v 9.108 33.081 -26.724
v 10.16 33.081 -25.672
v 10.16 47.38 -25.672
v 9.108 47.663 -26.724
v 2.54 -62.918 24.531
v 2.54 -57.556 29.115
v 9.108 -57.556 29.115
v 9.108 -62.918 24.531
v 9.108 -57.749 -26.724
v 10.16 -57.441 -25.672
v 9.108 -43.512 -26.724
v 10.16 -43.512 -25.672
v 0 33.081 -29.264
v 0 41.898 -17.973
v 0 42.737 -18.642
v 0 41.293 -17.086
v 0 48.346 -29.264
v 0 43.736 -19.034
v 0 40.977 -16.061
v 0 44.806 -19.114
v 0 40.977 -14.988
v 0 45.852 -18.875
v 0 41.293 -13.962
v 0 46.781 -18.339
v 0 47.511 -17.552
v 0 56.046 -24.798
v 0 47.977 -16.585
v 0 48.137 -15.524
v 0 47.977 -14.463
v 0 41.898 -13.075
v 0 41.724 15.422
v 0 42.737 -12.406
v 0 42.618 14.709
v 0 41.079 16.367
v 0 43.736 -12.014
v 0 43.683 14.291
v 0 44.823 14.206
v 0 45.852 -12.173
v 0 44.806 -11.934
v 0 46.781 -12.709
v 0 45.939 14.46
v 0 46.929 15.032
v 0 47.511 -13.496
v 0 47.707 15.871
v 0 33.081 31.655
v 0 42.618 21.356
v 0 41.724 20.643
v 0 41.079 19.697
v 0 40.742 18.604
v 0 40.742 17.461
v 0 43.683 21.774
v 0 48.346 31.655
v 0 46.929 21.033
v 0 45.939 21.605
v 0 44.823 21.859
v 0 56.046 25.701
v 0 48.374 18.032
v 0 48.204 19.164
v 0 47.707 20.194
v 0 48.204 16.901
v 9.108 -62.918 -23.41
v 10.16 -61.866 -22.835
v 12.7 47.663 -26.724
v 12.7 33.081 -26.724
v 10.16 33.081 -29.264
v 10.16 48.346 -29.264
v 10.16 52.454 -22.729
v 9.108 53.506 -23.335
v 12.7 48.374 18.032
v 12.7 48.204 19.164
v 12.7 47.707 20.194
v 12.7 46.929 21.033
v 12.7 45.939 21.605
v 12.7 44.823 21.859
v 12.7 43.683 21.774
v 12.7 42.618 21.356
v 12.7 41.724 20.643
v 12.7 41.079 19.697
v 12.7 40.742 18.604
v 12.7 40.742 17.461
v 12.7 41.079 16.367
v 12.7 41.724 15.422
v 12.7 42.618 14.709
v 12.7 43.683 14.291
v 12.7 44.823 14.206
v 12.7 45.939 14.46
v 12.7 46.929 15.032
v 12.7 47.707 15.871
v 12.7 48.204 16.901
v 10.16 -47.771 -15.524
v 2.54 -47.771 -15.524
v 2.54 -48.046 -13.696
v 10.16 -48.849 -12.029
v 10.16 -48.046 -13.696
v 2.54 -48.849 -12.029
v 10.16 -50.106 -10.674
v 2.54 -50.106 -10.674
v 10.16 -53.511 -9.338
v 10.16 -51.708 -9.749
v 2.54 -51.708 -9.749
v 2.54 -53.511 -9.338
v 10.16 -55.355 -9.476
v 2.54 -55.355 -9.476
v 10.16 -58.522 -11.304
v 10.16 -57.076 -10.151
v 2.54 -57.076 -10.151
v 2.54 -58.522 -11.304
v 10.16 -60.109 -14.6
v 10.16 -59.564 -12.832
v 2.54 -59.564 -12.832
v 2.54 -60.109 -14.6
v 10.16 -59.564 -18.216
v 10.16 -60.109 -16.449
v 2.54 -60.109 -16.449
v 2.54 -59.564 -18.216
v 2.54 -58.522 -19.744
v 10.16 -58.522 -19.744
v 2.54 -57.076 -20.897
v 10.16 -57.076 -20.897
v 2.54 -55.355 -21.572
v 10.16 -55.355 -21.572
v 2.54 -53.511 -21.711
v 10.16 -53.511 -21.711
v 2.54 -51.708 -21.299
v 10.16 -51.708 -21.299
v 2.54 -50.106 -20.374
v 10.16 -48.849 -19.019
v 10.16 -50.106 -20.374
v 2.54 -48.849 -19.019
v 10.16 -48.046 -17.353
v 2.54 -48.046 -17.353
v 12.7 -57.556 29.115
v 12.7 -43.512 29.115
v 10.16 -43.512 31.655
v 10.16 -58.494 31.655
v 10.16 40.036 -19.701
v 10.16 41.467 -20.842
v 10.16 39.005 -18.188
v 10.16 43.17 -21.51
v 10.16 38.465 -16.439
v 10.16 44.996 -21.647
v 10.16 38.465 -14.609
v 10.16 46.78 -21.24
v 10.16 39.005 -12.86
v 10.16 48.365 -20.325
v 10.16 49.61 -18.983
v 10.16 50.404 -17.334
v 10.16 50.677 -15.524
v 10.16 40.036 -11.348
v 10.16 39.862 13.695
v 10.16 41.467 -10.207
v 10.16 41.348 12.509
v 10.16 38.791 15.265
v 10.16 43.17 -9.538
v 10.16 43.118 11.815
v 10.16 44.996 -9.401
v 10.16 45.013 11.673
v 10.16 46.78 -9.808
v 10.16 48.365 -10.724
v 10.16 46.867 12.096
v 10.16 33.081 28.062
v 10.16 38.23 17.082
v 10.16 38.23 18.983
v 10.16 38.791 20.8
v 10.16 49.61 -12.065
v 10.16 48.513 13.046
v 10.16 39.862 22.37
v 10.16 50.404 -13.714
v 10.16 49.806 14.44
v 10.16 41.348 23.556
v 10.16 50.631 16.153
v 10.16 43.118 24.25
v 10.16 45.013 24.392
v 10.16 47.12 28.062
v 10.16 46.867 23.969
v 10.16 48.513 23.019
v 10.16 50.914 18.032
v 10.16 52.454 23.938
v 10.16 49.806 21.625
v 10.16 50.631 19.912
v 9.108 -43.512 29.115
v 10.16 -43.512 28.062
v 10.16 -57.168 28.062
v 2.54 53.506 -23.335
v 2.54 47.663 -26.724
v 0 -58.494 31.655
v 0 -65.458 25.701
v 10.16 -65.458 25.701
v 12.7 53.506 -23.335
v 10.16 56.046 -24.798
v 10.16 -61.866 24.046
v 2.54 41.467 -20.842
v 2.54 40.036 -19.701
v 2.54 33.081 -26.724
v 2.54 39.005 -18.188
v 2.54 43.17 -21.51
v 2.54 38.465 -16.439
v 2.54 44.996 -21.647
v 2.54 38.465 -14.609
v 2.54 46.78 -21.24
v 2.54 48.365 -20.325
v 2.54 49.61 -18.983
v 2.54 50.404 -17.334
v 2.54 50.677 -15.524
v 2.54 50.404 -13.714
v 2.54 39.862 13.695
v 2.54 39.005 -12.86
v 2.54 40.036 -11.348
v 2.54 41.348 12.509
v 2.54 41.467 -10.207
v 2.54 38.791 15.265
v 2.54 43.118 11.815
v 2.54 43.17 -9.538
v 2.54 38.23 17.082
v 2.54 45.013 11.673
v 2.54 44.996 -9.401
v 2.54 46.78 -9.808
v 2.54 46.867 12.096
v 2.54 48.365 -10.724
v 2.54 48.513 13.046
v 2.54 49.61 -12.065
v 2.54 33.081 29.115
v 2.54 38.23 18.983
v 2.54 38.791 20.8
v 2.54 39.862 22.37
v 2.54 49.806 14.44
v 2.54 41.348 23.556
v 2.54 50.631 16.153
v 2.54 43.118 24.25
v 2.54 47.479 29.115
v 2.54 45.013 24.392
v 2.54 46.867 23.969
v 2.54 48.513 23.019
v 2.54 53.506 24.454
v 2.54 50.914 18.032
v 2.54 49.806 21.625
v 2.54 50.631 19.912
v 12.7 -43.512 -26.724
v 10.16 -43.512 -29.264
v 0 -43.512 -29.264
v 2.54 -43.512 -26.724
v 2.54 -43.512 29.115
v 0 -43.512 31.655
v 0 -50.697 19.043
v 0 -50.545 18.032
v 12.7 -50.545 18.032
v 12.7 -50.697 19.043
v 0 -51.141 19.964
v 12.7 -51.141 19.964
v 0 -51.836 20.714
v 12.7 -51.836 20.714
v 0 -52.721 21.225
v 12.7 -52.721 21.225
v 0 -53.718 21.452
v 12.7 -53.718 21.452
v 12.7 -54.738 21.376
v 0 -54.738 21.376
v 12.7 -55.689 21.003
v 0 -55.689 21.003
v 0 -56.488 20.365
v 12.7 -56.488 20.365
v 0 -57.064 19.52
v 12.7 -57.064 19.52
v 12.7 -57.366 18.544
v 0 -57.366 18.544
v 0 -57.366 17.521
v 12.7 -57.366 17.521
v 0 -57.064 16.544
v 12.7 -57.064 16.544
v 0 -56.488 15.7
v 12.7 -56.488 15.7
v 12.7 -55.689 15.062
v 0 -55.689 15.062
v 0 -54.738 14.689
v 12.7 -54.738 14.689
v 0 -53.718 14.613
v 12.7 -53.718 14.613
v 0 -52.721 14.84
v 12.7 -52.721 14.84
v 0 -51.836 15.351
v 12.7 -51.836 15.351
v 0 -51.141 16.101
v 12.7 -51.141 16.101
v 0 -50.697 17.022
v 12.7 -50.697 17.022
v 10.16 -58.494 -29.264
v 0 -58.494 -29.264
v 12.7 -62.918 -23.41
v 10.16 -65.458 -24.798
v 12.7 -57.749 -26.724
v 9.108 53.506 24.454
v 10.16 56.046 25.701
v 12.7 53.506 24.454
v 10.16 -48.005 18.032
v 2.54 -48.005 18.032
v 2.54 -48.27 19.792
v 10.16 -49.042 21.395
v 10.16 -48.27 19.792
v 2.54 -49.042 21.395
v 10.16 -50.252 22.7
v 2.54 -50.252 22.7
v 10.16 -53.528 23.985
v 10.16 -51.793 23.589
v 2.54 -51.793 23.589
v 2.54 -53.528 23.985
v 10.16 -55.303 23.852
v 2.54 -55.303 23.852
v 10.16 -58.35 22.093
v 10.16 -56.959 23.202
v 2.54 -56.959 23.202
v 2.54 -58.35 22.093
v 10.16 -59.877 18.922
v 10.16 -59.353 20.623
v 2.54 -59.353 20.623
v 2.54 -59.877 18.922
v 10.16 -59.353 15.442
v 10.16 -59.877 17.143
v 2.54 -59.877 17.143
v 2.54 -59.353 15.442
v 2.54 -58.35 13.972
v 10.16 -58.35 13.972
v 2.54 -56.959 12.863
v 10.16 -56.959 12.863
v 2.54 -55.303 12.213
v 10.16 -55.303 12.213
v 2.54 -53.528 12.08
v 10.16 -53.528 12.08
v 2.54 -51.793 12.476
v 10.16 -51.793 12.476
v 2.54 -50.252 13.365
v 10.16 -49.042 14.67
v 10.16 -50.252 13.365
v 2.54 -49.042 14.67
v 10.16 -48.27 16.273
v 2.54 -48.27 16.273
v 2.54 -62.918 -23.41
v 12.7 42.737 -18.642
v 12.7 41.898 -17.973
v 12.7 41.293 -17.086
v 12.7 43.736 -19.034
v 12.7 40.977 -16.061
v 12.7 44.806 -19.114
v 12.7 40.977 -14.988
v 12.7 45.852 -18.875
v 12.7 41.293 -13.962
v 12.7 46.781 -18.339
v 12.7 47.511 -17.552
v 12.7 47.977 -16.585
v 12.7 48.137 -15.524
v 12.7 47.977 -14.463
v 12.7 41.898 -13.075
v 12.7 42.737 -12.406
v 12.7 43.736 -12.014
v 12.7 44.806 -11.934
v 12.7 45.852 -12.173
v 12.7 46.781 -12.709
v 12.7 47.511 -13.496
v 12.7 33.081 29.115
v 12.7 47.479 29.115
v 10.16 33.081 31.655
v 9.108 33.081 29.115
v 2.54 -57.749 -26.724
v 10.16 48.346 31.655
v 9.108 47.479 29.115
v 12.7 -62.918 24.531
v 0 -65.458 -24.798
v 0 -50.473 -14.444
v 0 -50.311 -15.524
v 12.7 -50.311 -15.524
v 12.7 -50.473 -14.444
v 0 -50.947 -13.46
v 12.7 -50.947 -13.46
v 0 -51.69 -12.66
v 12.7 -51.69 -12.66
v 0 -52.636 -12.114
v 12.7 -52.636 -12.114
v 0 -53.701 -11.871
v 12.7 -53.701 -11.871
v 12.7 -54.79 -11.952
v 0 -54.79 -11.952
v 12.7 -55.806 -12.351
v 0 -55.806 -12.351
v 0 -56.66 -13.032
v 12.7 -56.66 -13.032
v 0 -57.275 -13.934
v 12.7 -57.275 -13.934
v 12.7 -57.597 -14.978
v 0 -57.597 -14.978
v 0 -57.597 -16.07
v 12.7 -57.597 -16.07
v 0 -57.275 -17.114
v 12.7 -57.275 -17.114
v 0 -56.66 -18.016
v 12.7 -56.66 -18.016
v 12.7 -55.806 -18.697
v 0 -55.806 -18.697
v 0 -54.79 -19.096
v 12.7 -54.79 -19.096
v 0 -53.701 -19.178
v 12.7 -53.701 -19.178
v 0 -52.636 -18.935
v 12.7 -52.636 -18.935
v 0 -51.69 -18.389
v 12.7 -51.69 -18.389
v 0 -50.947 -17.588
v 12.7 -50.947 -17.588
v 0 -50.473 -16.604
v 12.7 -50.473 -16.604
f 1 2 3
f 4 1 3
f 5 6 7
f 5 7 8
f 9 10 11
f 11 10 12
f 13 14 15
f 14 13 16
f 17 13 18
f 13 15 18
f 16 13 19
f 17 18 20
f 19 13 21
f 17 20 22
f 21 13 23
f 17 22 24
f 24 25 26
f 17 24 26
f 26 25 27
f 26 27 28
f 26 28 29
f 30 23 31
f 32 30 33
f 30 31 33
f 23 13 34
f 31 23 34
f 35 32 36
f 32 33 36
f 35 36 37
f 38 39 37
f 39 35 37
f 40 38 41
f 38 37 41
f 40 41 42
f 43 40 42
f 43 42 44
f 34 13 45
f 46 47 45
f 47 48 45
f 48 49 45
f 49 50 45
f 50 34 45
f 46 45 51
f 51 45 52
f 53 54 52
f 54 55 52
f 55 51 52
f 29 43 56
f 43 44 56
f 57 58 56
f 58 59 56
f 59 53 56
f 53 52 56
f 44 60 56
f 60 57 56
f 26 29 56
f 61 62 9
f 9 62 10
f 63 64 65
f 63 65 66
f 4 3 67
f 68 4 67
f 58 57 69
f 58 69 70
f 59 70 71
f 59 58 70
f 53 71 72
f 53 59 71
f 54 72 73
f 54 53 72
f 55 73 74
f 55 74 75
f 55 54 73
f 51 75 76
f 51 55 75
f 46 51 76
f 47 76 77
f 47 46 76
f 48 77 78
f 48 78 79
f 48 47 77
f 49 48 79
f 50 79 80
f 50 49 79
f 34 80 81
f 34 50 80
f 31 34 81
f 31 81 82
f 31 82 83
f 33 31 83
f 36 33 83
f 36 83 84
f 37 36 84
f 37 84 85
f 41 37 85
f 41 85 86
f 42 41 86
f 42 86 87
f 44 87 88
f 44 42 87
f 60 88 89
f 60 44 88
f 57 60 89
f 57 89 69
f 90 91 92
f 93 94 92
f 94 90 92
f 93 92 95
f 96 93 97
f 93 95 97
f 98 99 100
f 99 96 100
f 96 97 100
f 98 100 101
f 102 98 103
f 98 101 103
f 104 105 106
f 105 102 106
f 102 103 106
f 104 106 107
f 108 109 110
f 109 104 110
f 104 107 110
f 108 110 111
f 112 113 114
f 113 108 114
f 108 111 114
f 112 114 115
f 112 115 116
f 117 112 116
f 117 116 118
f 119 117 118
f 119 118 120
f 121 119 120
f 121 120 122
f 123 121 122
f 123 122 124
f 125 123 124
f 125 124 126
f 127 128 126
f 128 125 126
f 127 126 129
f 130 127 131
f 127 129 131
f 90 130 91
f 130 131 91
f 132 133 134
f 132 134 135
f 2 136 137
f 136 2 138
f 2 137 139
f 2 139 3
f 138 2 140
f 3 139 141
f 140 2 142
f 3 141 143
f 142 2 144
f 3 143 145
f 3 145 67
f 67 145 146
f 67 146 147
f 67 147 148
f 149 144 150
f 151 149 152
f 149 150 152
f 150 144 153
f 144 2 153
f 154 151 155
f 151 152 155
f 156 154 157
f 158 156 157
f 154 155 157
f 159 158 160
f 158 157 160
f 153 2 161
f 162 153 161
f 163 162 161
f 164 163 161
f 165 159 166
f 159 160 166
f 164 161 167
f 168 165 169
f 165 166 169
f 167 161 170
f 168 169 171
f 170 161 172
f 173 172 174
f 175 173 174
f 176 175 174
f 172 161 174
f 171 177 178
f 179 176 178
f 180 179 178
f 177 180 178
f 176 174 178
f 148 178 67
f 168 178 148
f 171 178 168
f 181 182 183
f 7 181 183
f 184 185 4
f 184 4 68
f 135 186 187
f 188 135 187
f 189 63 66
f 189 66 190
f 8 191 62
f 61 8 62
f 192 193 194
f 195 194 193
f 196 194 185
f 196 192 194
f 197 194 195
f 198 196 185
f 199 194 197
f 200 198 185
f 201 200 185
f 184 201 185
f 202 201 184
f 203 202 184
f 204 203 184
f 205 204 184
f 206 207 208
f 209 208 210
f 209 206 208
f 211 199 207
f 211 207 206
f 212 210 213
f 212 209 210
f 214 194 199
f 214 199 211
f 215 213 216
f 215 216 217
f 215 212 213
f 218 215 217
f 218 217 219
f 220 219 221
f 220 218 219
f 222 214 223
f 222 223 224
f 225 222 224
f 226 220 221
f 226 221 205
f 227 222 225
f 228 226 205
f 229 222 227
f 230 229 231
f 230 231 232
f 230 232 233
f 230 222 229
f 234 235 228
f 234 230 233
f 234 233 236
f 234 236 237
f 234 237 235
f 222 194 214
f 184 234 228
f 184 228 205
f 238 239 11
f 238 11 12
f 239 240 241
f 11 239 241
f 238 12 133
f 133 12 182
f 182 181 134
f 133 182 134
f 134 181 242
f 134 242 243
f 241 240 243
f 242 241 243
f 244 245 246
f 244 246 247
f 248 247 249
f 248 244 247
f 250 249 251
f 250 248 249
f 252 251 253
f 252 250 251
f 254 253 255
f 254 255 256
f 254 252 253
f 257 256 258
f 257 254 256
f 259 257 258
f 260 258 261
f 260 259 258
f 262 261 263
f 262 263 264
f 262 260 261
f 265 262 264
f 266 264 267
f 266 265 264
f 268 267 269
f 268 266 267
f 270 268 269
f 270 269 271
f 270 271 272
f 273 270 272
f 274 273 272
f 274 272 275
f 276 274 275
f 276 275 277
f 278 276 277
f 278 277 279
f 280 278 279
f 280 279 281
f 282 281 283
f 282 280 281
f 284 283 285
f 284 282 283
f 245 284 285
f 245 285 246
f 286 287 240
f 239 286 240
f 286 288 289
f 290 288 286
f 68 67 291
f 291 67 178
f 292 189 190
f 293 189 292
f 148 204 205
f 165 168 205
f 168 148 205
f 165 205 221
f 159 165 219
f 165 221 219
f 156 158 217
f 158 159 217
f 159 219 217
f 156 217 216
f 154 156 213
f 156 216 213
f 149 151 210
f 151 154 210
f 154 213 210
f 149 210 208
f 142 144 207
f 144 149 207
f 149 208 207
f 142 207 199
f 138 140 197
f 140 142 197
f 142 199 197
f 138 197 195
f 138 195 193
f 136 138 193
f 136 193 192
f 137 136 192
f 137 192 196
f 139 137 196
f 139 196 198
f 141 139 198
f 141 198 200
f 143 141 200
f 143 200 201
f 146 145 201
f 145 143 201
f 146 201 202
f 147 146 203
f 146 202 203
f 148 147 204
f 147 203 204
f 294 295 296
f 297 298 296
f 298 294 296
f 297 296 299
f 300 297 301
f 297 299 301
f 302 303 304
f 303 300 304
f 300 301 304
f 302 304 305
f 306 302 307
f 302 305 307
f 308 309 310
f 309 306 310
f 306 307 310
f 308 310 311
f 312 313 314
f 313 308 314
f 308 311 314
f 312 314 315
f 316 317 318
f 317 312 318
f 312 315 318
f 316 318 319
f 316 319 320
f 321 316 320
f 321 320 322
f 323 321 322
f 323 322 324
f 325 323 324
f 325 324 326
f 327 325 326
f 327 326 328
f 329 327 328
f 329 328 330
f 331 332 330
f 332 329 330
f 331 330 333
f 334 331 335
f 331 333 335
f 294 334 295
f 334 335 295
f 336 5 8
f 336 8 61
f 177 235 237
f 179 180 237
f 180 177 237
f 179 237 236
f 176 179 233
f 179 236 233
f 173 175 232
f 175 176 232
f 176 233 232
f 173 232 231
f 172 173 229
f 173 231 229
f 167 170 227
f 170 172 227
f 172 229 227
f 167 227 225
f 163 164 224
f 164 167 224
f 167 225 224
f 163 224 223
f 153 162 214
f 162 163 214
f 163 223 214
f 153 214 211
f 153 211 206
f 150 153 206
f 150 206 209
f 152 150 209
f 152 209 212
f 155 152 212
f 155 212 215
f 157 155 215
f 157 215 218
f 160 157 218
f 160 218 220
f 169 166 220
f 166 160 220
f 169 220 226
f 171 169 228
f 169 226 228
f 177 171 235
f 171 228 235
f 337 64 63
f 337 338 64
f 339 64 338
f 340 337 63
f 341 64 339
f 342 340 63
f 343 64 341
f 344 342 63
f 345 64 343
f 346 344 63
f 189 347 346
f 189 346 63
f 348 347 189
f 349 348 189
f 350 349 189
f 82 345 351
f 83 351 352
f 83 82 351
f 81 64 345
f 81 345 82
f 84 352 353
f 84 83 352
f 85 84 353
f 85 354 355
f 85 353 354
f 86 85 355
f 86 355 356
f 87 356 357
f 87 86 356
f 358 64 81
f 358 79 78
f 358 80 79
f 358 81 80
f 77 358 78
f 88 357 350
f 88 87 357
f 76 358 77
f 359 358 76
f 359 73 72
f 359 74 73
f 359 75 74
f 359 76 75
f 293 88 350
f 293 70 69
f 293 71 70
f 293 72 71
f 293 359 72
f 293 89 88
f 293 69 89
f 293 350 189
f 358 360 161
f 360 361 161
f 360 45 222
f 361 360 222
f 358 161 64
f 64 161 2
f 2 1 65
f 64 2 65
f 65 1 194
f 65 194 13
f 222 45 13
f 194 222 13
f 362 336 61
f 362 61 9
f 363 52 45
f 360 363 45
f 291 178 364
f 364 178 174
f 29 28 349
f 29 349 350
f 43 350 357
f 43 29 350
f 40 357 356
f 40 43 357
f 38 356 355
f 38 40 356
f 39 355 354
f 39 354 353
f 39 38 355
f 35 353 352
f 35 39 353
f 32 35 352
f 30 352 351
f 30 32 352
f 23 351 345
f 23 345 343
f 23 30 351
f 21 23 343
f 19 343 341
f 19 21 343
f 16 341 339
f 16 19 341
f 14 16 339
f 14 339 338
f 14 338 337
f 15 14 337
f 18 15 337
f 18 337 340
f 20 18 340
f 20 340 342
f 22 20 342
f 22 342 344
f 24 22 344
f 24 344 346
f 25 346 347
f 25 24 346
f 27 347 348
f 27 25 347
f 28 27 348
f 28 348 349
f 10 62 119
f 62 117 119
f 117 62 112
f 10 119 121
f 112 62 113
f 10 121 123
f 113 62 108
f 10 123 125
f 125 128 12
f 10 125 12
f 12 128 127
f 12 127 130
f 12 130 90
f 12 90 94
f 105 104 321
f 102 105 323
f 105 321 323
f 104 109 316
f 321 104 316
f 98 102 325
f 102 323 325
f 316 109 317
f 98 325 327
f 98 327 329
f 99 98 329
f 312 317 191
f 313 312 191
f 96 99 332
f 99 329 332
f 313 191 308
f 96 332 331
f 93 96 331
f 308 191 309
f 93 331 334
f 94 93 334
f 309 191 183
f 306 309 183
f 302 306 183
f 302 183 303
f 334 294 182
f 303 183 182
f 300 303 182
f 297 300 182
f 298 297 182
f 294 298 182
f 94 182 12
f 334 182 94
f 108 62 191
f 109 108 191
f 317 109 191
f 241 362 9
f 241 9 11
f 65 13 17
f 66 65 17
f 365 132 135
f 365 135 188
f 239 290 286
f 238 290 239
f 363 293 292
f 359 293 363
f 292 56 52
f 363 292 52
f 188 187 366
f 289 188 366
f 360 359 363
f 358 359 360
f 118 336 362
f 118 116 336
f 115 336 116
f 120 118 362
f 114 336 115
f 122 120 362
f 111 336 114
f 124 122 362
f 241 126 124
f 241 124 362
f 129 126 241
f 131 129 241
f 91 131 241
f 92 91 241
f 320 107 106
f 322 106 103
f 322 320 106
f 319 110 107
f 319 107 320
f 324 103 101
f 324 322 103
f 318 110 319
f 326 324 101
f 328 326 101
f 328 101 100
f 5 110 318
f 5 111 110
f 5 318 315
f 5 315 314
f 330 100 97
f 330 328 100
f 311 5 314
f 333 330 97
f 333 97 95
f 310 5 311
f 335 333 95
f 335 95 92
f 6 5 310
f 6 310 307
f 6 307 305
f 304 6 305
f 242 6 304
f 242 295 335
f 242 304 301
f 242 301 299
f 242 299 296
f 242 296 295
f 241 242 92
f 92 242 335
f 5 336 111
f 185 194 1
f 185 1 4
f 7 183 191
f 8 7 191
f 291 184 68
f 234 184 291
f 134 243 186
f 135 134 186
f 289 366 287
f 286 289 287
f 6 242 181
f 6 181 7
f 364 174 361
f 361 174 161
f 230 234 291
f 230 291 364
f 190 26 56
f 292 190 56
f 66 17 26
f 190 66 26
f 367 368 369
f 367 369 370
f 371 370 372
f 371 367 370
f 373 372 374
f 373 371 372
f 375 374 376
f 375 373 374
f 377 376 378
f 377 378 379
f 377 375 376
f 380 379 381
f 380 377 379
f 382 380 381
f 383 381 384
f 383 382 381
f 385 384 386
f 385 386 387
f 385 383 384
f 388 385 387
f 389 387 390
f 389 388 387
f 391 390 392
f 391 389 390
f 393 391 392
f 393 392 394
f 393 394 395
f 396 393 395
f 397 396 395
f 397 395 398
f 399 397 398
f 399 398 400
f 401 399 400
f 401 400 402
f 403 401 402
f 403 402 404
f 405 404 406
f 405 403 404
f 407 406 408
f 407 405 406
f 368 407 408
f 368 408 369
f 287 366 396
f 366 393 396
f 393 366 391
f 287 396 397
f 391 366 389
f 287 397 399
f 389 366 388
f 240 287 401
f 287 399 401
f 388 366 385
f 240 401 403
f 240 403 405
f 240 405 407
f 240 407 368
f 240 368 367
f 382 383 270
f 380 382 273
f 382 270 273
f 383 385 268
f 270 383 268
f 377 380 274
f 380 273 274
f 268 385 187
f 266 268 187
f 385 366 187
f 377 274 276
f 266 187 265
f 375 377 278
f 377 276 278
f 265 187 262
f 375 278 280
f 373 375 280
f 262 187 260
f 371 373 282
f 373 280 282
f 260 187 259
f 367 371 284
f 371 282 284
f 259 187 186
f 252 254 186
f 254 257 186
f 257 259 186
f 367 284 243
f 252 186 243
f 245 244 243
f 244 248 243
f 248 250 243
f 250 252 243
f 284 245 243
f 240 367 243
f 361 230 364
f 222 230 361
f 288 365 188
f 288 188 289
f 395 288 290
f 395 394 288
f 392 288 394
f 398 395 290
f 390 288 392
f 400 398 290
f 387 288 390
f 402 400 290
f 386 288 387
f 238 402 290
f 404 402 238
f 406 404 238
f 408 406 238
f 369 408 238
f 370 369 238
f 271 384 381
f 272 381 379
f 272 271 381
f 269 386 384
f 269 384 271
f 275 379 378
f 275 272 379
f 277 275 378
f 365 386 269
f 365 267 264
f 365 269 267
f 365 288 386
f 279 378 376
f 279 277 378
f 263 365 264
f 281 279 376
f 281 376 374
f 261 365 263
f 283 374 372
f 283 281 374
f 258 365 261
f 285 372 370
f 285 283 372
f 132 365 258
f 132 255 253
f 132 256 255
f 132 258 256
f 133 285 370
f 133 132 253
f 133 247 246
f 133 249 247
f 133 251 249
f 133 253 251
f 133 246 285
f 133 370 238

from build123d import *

# Parameters (mm, degrees)
F0_R      = 3.6002021033
F0_R_2    = 3.8374661776
F1_DEPTH  = 12.7
F0_R_3    = 3.6638057652
F0_R_4    = 3.429521016
F2_SIZE   = 2.54
F2_2_SIZE = 2.54
F3_T      = -2.54
F3_2_T    = -2.54


with BuildPart() as f1:
    # F0 (on Right) → F1 (new body)
    with BuildSketch(Plane.YZ):
        Polygon((48.3463816345, 31.6545777023), (33.0807119608, 31.6545777023), (33.0807119608, -29.2643960565), (48.3463816345, -29.2643960565), (56.046359241, -24.798180908), (56.046359241, 25.7010944188), align=None)
        with Locations((44.5367097855, -15.5241359025)):
            Circle(F0_R, mode=Mode.SUBTRACT)
        with Locations((44.5367097855, 18.0324837565)):
            Circle(F0_R_2, mode=Mode.SUBTRACT)
    extrude(amount=F1_DEPTH)

    # F2
    f2_edges = [f1.edges().sort_by_distance(p)[0] for p in [
        (12.7, 40.713547, 31.654578),
        (12.7, 52.19637, 28.677836),
        (12.7, 56.046359, 0.451457),
        (12.7, 40.713547, -29.264396),
        (12.7, 52.19637, -27.031288),
    ]]
    chamfer(f2_edges, length=F2_SIZE)

    # F3
    f3_openings = [f1.faces().sort_by_distance(p)[0] for p in [
        (6.303722, 33.080712, 1.195091),
    ]]
    offset(amount=F3_T, openings=f3_openings)


with BuildPart() as f1b:
    # F0 (on Right) → F1, piece 2 (new body)
    with BuildSketch(Plane.YZ):
        Polygon((-43.512262404, -29.2643960565), (-43.512262404, 31.6545777023), (-58.4939457476, 31.6545777023), (-65.4580891132, 25.7010944188), (-65.4580891132, -24.798180908), (-58.4939457476, -29.2643960565), align=None)
        with Locations((-53.9743751287, -15.5241359025)):
            Circle(F0_R_3, mode=Mode.SUBTRACT)
        with Locations((-53.9743751287, 18.0324837565)):
            Circle(F0_R_4, mode=Mode.SUBTRACT)
    extrude(amount=F1_DEPTH)

    # F2#2
    f2_2_edges = [f1b.edges().sort_by_distance(p)[0] for p in [
        (12.7, -51.003104, 31.654578),
        (12.7, -61.976017, 28.677836),
        (12.7, -65.458089, 0.451457),
        (12.7, -61.976017, -27.031288),
        (12.7, -51.003104, -29.264396),
    ]]
    chamfer(f2_2_edges, length=F2_2_SIZE)

    # F3#2
    f3_2_openings = [f1b.faces().sort_by_distance(p)[0] for p in [
        (6.303722, -43.512262, 1.195091),
    ]]
    offset(amount=F3_2_T, openings=f3_2_openings)


solid = Compound([f1.part, f1b.part])
